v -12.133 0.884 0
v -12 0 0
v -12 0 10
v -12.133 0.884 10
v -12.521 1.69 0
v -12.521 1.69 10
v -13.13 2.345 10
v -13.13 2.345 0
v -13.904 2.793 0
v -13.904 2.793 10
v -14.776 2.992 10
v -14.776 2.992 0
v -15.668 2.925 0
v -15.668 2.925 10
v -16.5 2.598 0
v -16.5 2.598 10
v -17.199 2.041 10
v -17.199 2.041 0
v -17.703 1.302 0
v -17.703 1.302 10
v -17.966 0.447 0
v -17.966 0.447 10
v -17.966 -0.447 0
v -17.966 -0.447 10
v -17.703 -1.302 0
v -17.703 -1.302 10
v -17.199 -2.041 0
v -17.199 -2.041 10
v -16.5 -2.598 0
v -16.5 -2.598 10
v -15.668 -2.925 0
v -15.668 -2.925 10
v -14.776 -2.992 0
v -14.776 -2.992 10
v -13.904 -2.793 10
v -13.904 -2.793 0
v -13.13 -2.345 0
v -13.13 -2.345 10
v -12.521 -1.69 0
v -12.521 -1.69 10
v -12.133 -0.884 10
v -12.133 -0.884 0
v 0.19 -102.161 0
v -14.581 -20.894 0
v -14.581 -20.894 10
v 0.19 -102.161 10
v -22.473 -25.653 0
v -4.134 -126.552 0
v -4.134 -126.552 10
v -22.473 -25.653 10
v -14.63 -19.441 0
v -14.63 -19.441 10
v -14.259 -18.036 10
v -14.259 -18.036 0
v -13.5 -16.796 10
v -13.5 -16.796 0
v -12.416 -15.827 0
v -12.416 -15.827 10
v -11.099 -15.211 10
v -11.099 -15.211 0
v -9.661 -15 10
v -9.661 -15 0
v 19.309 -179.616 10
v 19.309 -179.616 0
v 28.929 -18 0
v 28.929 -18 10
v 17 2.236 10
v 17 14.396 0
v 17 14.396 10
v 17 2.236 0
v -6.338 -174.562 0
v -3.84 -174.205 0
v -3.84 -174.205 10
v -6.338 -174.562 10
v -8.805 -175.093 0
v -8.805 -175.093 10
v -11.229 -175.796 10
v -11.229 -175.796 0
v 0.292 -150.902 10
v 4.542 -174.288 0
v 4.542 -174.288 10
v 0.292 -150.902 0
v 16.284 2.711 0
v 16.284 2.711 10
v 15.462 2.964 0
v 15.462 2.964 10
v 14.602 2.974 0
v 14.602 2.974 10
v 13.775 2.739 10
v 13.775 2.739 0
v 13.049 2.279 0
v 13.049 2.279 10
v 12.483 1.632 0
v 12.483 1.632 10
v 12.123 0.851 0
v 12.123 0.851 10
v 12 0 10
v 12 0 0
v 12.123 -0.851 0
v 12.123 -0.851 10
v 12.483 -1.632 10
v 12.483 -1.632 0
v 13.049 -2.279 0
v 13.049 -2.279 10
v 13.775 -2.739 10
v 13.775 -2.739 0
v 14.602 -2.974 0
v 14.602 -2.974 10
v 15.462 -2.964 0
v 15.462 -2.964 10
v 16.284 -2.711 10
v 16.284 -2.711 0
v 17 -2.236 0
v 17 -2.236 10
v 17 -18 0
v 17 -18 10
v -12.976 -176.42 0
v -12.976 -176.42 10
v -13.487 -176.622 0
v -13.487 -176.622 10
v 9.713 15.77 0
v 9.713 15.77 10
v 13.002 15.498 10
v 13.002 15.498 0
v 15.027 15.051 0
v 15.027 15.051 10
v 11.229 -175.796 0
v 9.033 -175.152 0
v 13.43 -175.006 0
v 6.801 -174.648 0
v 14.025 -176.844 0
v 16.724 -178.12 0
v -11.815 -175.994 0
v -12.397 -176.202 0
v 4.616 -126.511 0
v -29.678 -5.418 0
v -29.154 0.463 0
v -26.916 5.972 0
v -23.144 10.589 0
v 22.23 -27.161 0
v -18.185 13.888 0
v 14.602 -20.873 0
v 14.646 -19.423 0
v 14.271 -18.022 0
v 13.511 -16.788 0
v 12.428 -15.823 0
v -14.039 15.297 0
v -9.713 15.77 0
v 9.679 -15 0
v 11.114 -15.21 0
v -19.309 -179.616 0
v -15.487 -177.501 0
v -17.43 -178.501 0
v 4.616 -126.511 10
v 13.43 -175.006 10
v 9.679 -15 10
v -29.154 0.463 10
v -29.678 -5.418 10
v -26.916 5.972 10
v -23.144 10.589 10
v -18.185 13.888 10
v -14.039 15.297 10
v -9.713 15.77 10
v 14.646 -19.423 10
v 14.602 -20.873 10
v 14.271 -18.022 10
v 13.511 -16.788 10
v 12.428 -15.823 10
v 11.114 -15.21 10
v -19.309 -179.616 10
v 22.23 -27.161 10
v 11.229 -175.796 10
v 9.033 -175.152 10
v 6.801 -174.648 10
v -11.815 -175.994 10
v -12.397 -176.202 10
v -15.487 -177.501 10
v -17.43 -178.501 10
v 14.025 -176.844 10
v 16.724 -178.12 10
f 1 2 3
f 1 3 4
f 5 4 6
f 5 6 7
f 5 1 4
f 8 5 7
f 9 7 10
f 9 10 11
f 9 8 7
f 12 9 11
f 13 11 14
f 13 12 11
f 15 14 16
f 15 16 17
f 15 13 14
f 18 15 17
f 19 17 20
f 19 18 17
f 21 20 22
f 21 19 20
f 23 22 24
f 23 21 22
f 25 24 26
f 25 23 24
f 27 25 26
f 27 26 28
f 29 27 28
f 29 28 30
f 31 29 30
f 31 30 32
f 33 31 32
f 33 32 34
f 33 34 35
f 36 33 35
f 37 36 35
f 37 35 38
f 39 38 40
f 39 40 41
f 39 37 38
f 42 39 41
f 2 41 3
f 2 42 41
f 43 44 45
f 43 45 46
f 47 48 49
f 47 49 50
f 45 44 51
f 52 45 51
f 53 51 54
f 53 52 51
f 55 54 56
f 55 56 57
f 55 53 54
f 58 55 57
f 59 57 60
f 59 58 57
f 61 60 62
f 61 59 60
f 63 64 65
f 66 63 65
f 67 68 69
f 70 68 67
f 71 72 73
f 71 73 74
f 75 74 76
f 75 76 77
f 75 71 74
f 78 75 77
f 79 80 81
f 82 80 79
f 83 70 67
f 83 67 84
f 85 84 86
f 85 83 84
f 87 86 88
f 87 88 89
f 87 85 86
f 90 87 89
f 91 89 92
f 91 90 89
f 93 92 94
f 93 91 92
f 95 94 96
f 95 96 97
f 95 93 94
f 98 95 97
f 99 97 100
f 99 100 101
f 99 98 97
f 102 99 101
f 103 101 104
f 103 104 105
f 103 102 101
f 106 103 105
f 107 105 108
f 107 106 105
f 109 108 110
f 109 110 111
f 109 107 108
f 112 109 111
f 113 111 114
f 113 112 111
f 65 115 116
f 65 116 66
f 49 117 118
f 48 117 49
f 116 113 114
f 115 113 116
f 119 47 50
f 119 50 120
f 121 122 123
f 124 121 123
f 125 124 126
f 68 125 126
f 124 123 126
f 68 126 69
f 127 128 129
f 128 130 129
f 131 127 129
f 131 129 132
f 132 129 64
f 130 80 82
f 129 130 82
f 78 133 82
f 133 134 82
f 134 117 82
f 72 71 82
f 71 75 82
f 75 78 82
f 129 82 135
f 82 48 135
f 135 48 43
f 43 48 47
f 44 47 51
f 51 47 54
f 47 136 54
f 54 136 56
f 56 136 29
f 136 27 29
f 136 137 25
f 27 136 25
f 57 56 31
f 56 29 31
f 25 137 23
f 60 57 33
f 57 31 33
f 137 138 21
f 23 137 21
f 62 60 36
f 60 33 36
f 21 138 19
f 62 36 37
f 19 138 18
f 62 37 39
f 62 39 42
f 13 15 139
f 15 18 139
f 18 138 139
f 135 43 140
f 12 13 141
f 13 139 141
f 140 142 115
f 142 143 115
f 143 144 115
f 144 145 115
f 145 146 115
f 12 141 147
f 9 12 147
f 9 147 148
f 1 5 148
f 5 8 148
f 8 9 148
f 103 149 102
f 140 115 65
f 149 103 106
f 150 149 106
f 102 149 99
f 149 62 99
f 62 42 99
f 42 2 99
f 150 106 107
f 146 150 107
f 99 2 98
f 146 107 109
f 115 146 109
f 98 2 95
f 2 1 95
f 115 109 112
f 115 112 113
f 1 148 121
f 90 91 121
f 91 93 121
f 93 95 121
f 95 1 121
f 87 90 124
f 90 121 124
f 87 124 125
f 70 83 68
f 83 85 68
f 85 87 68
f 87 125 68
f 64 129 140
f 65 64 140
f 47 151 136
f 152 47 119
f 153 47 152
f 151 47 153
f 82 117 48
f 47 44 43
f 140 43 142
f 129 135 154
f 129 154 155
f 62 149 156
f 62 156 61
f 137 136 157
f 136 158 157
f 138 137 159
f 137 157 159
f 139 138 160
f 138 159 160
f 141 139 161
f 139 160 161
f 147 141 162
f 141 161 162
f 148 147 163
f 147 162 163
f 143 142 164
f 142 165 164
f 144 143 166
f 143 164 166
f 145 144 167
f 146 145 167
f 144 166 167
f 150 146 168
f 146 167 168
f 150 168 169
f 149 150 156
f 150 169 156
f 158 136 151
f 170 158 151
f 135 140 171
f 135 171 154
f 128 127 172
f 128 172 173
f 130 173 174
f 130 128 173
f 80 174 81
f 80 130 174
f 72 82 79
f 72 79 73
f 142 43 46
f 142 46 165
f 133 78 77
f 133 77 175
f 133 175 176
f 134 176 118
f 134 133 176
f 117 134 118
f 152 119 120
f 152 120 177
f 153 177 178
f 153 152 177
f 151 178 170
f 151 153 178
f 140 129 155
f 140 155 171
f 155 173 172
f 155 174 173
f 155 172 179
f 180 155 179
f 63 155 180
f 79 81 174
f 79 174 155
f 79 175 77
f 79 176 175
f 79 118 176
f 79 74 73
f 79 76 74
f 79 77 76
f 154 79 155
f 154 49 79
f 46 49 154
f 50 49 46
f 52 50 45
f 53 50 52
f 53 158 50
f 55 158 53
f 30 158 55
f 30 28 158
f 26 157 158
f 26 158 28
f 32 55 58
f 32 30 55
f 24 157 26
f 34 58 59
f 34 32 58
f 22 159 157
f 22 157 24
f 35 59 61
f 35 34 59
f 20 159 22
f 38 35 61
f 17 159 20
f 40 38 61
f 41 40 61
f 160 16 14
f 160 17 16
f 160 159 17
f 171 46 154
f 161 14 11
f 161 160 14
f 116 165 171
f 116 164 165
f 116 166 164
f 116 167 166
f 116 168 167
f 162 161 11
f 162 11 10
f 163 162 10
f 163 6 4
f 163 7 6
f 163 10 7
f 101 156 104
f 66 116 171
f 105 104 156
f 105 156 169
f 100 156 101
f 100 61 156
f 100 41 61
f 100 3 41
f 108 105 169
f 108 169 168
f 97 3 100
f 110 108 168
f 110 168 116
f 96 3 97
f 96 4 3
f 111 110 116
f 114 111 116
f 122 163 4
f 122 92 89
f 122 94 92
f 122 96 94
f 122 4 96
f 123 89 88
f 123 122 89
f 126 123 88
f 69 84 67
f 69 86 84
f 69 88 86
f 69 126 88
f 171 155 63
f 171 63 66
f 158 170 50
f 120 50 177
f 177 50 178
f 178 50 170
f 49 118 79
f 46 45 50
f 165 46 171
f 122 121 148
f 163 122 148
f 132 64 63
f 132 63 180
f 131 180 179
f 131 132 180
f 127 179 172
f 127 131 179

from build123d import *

# Parameters (mm, degrees)
SKETCH1_R           = 3
BOSS_EXTRUDE2_DEPTH = 10
FILLET1_R           = 20
FILLET2_R           = 20
CUT_EXTRUDE1_START  = -10
CUT_EXTRUDE1_DEPTH  = 10
FILLET3_R           = 5
CUT_EXTRUDE3_START  = -10
SKETCH5_W           = 12
SKETCH5_H           = 10
CUT_EXTRUDE3_DEPTH  = 10


with BuildPart() as part:
    # Sketch1 → Boss-Extrude2 (new body)
    with BuildSketch(Plane.XY):
        with BuildLine():
            Line((-30, 15.770412854), (-30, 0))
            Line((-30, 0), (-17.5, -210))
            ThreePointArc((-17.5, -210), (0, -227.5), (17.5, -210))
            Line((17.5, -210), (30, 0))
            Line((30, 0), (30, 15.770412854))
            Line((30, 15.770412854), (-30, 15.770412854))
        make_face()
        with Locations((-15, 0)):
            Circle(SKETCH1_R, mode=Mode.SUBTRACT)
        with Locations((15, 0)):
            Circle(SKETCH1_R, mode=Mode.SUBTRACT)
        Polygon((0, -205), (6, -205), (6, -215), (-6, -215), (-6, -205), align=None, mode=Mode.SUBTRACT)
    extrude(amount=BOSS_EXTRUDE2_DEPTH)

    # Fillet1
    fillet1_edges = [part.edges().sort_by_distance(p)[0] for p in [
        (-30, 15.770412854, 5),
    ]]
    fillet(fillet1_edges, radius=FILLET1_R)

    # Fillet2
    fillet2_edges = [part.edges().sort_by_distance(p)[0] for p in [
        (30, 15.770412854, 5),
    ]]
    fillet(fillet2_edges, radius=FILLET2_R)

    # Sketch4 → Cut-Extrude1 (cut)
    with BuildSketch(Plane.XY.offset(10).offset(CUT_EXTRUDE1_START)):
        Polygon((-15.651797422, -15), (0.190220551, -102.160979768), (15.643622882, -15), (15, -15), align=None)
        Polygon((-22.473027071, -25.6531452), (-13.367328465, -178.628881795), (-4.134156204, -126.551525408), align=None)
        Polygon((22.230419841, -27.161313899), (4.615986353, -126.511039477), (13.430162671, -175.005634359), align=None)
        with BuildLine():
            Line((0.291609598, -150.901585116), (-7.372445375, -194.128735111))
            ThreePointArc((-7.372445375, -194.128735111), (0.476576628, -192.506490497), (8.225632191, -194.553674383))
            Line((8.225632191, -194.553674383), (0.291609598, -150.901585116))
        make_face()
    extrude(amount=CUT_EXTRUDE1_DEPTH, mode=Mode.SUBTRACT)

    # Fillet3
    fillet3_edges = [part.edges().sort_by_distance(p)[0] for p in [
        (8.225632191, -194.553674383, 5),
        (-7.372445375, -194.128735111, 5),
        (-15.651797422, -15, 5),
        (15.643622882, -15, 5),
    ]]
    fillet(fillet3_edges, radius=FILLET3_R)

    # Sketch5 → Cut-Extrude3 (cut)
    # profile 1 of 10: a face of its own
    with BuildSketch(Plane.XY.offset(10).offset(CUT_EXTRUDE3_START)):
        with BuildLine():
            Line((-4.167269409, -176.050756454), (-4.122092315, -175.795946561))
            Line((-4.122092315, -175.795946561), (-11.228656567, -175.795946561))
            ThreePointArc((-11.228656567, -175.795946561), (-12.106175916, -176.096600396), (-12.975657802, -176.419763184))
            Line((-12.975657802, -176.419763184), (-13.345719148, -178.506999951))
            ThreePointArc((-13.345719148, -178.506999951), (-8.842198544, -176.958619935), (-4.167269409, -176.050756454))
        make_face()
    # profile 2 of 10: a face of its own
    with BuildSketch(Plane.XY.offset(10).offset(CUT_EXTRUDE3_START)):
        with BuildLine():
            ThreePointArc((-13.486799408, -176.621769943), (-16.46588928, -177.986339006), (-19.308563513, -179.61613298))
            Line((-19.308563513, -179.61613298), (-19.185515511, -181.683339422))
            ThreePointArc((-19.185515511, -181.683339422), (-16.356398794, -179.96026814), (-13.373872309, -178.518945203))
            Line((-13.373872309, -178.518945203), (-13.486799408, -176.621769943))
        make_face()
    # profile 3 of 10: a face of its own
    with BuildSketch(Plane.XY.offset(10).offset(CUT_EXTRUDE3_START)):
        with BuildLine():
            Line((-4.122092315, -175.795946561), (-3.840092025, -174.205395752))
            ThreePointArc((-3.840092025, -174.205395752), (-7.576229867, -174.806240028), (-11.228656567, -175.795946561))
            Line((-11.228656567, -175.795946561), (-4.122092315, -175.795946561))
        make_face()
    # profile 4 of 10: a face of its own
    with BuildSketch(Plane.XY.offset(10).offset(CUT_EXTRUDE3_START)):
        with BuildLine():
            Line((4.816305425, -175.795946561), (11.228656567, -175.795946561))
            ThreePointArc((11.228656567, -175.795946561), (7.921392788, -174.882318751), (4.542172021, -174.287695771))
            Line((4.542172021, -174.287695771), (4.816305425, -175.795946561))
        make_face()
    # profile 5 of 10: a face of its own
    with BuildSketch(Plane.XY.offset(10).offset(CUT_EXTRUDE3_START)):
        with BuildLine():
            ThreePointArc((19.308563513, -179.61613298), (15.387621929, -177.454323), (11.228656567, -175.795946561))
            Line((11.228656567, -175.795946561), (4.816305425, -175.795946561))
            Line((4.816305425, -175.795946561), (4.879901452, -176.145844664))
            ThreePointArc((4.879901452, -176.145844664), (12.347146855, -178.102269105), (19.185515511, -181.683339422))
            Line((19.185515511, -181.683339422), (19.308563513, -179.61613298))
        make_face()
    # profile 6 of 10: a face of its own
    with BuildSketch(Plane.XY.offset(10).offset(CUT_EXTRUDE3_START)):
        with BuildLine():
            Line((18.887385797, -186.691918617), (19.185515511, -181.683339422))
            ThreePointArc((19.185515511, -181.683339422), (12.347146855, -178.102269105), (4.879901452, -176.145844664))
            Line((4.879901452, -176.145844664), (5.679005105, -180.54242201))
            ThreePointArc((5.679005105, -180.54242201), (12.662186526, -182.803142969), (18.887385797, -186.691918617))
        make_face()
    # profile 7 of 10: a face of its own
    with BuildSketch(Plane.XY.offset(10).offset(CUT_EXTRUDE3_START)):
        with BuildLine():
            Line((17.5, -210), (18.887385797, -186.691918617))
            ThreePointArc((18.887385797, -186.691918617), (12.662186526, -182.803142969), (5.679005105, -180.54242201))
            Line((5.679005105, -180.54242201), (6.795310384, -186.684206595))
            ThreePointArc((6.795310384, -186.684206595), (5.577551358, -190.939561161), (1.45903868, -192.560928748))
            ThreePointArc((1.45903868, -192.560928748), (0.292984986, -192.502452749), (-0.874372768, -192.521857299))
            ThreePointArc((-0.874372768, -192.521857299), (-4.874459747, -190.834989527), (-6.047413252, -186.655228912))
            Line((-6.047413252, -186.655228912), (-4.940068564, -180.409533248))
            ThreePointArc((-4.940068564, -180.409533248), (-12.320876057, -182.646828096), (-18.887385797, -186.691918617))
            Line((-18.887385797, -186.691918617), (-17.5, -210))
            ThreePointArc((-17.5, -210), (0, -227.5), (17.5, -210))
        make_face()
        with Locations((0, -210)):
            Rectangle(SKETCH5_W, SKETCH5_H, mode=Mode.SUBTRACT)
    # profile 8 of 10: a face of its own
    with BuildSketch(Plane.XY.offset(10).offset(CUT_EXTRUDE3_START)):
        with BuildLine():
            Line((-4.940068564, -180.409533248), (-4.167269409, -176.050756454))
            ThreePointArc((-4.167269409, -176.050756454), (-8.842198544, -176.958619935), (-13.345719148, -178.506999951))
            Line((-13.345719148, -178.506999951), (-13.367328465, -178.628881795))
            Line((-13.367328465, -178.628881795), (-13.373872309, -178.518945203))
            ThreePointArc((-13.373872309, -178.518945203), (-16.356398794, -179.96026814), (-19.185515511, -181.683339422))
            Line((-19.185515511, -181.683339422), (-18.887385797, -186.691918617))
            ThreePointArc((-18.887385797, -186.691918617), (-12.320876057, -182.646828096), (-4.940068564, -180.409533248))
        make_face()
    # profile 9 of 10: a face of its own
    with BuildSketch(Plane.XY.offset(10).offset(CUT_EXTRUDE3_START)):
        with BuildLine():
            ThreePointArc((17, 2.236067977), (17.738612788, 1.224744871), (18, 0))
            Line((18, 0), (29.260488635, 0))
            ThreePointArc((29.260488635, 0), (24.938968919, 8.738256866), (17, 14.39559177))
            Line((17, 14.39559177), (17, 2.236067977))
        make_face()
    # profile 10 of 10: a face of its own
    with BuildSketch(Plane.XY.offset(10).offset(CUT_EXTRUDE3_START)):
        with BuildLine():
            Line((29.260488635, 0), (18, 0))
            ThreePointArc((18, 0), (17.738612788, -1.224744871), (17, -2.236067977))
            Line((17, -2.236067977), (17, -18))
            Line((17, -18), (28.928571429, -18))
            Line((28.928571429, -18), (29.677502384, -5.417959945))
            ThreePointArc((29.677502384, -5.417959945), (29.653859351, -2.694751229), (29.260488635, 0))
        make_face()
    extrude(amount=CUT_EXTRUDE3_DEPTH, mode=Mode.SUBTRACT)


solid = part.part
